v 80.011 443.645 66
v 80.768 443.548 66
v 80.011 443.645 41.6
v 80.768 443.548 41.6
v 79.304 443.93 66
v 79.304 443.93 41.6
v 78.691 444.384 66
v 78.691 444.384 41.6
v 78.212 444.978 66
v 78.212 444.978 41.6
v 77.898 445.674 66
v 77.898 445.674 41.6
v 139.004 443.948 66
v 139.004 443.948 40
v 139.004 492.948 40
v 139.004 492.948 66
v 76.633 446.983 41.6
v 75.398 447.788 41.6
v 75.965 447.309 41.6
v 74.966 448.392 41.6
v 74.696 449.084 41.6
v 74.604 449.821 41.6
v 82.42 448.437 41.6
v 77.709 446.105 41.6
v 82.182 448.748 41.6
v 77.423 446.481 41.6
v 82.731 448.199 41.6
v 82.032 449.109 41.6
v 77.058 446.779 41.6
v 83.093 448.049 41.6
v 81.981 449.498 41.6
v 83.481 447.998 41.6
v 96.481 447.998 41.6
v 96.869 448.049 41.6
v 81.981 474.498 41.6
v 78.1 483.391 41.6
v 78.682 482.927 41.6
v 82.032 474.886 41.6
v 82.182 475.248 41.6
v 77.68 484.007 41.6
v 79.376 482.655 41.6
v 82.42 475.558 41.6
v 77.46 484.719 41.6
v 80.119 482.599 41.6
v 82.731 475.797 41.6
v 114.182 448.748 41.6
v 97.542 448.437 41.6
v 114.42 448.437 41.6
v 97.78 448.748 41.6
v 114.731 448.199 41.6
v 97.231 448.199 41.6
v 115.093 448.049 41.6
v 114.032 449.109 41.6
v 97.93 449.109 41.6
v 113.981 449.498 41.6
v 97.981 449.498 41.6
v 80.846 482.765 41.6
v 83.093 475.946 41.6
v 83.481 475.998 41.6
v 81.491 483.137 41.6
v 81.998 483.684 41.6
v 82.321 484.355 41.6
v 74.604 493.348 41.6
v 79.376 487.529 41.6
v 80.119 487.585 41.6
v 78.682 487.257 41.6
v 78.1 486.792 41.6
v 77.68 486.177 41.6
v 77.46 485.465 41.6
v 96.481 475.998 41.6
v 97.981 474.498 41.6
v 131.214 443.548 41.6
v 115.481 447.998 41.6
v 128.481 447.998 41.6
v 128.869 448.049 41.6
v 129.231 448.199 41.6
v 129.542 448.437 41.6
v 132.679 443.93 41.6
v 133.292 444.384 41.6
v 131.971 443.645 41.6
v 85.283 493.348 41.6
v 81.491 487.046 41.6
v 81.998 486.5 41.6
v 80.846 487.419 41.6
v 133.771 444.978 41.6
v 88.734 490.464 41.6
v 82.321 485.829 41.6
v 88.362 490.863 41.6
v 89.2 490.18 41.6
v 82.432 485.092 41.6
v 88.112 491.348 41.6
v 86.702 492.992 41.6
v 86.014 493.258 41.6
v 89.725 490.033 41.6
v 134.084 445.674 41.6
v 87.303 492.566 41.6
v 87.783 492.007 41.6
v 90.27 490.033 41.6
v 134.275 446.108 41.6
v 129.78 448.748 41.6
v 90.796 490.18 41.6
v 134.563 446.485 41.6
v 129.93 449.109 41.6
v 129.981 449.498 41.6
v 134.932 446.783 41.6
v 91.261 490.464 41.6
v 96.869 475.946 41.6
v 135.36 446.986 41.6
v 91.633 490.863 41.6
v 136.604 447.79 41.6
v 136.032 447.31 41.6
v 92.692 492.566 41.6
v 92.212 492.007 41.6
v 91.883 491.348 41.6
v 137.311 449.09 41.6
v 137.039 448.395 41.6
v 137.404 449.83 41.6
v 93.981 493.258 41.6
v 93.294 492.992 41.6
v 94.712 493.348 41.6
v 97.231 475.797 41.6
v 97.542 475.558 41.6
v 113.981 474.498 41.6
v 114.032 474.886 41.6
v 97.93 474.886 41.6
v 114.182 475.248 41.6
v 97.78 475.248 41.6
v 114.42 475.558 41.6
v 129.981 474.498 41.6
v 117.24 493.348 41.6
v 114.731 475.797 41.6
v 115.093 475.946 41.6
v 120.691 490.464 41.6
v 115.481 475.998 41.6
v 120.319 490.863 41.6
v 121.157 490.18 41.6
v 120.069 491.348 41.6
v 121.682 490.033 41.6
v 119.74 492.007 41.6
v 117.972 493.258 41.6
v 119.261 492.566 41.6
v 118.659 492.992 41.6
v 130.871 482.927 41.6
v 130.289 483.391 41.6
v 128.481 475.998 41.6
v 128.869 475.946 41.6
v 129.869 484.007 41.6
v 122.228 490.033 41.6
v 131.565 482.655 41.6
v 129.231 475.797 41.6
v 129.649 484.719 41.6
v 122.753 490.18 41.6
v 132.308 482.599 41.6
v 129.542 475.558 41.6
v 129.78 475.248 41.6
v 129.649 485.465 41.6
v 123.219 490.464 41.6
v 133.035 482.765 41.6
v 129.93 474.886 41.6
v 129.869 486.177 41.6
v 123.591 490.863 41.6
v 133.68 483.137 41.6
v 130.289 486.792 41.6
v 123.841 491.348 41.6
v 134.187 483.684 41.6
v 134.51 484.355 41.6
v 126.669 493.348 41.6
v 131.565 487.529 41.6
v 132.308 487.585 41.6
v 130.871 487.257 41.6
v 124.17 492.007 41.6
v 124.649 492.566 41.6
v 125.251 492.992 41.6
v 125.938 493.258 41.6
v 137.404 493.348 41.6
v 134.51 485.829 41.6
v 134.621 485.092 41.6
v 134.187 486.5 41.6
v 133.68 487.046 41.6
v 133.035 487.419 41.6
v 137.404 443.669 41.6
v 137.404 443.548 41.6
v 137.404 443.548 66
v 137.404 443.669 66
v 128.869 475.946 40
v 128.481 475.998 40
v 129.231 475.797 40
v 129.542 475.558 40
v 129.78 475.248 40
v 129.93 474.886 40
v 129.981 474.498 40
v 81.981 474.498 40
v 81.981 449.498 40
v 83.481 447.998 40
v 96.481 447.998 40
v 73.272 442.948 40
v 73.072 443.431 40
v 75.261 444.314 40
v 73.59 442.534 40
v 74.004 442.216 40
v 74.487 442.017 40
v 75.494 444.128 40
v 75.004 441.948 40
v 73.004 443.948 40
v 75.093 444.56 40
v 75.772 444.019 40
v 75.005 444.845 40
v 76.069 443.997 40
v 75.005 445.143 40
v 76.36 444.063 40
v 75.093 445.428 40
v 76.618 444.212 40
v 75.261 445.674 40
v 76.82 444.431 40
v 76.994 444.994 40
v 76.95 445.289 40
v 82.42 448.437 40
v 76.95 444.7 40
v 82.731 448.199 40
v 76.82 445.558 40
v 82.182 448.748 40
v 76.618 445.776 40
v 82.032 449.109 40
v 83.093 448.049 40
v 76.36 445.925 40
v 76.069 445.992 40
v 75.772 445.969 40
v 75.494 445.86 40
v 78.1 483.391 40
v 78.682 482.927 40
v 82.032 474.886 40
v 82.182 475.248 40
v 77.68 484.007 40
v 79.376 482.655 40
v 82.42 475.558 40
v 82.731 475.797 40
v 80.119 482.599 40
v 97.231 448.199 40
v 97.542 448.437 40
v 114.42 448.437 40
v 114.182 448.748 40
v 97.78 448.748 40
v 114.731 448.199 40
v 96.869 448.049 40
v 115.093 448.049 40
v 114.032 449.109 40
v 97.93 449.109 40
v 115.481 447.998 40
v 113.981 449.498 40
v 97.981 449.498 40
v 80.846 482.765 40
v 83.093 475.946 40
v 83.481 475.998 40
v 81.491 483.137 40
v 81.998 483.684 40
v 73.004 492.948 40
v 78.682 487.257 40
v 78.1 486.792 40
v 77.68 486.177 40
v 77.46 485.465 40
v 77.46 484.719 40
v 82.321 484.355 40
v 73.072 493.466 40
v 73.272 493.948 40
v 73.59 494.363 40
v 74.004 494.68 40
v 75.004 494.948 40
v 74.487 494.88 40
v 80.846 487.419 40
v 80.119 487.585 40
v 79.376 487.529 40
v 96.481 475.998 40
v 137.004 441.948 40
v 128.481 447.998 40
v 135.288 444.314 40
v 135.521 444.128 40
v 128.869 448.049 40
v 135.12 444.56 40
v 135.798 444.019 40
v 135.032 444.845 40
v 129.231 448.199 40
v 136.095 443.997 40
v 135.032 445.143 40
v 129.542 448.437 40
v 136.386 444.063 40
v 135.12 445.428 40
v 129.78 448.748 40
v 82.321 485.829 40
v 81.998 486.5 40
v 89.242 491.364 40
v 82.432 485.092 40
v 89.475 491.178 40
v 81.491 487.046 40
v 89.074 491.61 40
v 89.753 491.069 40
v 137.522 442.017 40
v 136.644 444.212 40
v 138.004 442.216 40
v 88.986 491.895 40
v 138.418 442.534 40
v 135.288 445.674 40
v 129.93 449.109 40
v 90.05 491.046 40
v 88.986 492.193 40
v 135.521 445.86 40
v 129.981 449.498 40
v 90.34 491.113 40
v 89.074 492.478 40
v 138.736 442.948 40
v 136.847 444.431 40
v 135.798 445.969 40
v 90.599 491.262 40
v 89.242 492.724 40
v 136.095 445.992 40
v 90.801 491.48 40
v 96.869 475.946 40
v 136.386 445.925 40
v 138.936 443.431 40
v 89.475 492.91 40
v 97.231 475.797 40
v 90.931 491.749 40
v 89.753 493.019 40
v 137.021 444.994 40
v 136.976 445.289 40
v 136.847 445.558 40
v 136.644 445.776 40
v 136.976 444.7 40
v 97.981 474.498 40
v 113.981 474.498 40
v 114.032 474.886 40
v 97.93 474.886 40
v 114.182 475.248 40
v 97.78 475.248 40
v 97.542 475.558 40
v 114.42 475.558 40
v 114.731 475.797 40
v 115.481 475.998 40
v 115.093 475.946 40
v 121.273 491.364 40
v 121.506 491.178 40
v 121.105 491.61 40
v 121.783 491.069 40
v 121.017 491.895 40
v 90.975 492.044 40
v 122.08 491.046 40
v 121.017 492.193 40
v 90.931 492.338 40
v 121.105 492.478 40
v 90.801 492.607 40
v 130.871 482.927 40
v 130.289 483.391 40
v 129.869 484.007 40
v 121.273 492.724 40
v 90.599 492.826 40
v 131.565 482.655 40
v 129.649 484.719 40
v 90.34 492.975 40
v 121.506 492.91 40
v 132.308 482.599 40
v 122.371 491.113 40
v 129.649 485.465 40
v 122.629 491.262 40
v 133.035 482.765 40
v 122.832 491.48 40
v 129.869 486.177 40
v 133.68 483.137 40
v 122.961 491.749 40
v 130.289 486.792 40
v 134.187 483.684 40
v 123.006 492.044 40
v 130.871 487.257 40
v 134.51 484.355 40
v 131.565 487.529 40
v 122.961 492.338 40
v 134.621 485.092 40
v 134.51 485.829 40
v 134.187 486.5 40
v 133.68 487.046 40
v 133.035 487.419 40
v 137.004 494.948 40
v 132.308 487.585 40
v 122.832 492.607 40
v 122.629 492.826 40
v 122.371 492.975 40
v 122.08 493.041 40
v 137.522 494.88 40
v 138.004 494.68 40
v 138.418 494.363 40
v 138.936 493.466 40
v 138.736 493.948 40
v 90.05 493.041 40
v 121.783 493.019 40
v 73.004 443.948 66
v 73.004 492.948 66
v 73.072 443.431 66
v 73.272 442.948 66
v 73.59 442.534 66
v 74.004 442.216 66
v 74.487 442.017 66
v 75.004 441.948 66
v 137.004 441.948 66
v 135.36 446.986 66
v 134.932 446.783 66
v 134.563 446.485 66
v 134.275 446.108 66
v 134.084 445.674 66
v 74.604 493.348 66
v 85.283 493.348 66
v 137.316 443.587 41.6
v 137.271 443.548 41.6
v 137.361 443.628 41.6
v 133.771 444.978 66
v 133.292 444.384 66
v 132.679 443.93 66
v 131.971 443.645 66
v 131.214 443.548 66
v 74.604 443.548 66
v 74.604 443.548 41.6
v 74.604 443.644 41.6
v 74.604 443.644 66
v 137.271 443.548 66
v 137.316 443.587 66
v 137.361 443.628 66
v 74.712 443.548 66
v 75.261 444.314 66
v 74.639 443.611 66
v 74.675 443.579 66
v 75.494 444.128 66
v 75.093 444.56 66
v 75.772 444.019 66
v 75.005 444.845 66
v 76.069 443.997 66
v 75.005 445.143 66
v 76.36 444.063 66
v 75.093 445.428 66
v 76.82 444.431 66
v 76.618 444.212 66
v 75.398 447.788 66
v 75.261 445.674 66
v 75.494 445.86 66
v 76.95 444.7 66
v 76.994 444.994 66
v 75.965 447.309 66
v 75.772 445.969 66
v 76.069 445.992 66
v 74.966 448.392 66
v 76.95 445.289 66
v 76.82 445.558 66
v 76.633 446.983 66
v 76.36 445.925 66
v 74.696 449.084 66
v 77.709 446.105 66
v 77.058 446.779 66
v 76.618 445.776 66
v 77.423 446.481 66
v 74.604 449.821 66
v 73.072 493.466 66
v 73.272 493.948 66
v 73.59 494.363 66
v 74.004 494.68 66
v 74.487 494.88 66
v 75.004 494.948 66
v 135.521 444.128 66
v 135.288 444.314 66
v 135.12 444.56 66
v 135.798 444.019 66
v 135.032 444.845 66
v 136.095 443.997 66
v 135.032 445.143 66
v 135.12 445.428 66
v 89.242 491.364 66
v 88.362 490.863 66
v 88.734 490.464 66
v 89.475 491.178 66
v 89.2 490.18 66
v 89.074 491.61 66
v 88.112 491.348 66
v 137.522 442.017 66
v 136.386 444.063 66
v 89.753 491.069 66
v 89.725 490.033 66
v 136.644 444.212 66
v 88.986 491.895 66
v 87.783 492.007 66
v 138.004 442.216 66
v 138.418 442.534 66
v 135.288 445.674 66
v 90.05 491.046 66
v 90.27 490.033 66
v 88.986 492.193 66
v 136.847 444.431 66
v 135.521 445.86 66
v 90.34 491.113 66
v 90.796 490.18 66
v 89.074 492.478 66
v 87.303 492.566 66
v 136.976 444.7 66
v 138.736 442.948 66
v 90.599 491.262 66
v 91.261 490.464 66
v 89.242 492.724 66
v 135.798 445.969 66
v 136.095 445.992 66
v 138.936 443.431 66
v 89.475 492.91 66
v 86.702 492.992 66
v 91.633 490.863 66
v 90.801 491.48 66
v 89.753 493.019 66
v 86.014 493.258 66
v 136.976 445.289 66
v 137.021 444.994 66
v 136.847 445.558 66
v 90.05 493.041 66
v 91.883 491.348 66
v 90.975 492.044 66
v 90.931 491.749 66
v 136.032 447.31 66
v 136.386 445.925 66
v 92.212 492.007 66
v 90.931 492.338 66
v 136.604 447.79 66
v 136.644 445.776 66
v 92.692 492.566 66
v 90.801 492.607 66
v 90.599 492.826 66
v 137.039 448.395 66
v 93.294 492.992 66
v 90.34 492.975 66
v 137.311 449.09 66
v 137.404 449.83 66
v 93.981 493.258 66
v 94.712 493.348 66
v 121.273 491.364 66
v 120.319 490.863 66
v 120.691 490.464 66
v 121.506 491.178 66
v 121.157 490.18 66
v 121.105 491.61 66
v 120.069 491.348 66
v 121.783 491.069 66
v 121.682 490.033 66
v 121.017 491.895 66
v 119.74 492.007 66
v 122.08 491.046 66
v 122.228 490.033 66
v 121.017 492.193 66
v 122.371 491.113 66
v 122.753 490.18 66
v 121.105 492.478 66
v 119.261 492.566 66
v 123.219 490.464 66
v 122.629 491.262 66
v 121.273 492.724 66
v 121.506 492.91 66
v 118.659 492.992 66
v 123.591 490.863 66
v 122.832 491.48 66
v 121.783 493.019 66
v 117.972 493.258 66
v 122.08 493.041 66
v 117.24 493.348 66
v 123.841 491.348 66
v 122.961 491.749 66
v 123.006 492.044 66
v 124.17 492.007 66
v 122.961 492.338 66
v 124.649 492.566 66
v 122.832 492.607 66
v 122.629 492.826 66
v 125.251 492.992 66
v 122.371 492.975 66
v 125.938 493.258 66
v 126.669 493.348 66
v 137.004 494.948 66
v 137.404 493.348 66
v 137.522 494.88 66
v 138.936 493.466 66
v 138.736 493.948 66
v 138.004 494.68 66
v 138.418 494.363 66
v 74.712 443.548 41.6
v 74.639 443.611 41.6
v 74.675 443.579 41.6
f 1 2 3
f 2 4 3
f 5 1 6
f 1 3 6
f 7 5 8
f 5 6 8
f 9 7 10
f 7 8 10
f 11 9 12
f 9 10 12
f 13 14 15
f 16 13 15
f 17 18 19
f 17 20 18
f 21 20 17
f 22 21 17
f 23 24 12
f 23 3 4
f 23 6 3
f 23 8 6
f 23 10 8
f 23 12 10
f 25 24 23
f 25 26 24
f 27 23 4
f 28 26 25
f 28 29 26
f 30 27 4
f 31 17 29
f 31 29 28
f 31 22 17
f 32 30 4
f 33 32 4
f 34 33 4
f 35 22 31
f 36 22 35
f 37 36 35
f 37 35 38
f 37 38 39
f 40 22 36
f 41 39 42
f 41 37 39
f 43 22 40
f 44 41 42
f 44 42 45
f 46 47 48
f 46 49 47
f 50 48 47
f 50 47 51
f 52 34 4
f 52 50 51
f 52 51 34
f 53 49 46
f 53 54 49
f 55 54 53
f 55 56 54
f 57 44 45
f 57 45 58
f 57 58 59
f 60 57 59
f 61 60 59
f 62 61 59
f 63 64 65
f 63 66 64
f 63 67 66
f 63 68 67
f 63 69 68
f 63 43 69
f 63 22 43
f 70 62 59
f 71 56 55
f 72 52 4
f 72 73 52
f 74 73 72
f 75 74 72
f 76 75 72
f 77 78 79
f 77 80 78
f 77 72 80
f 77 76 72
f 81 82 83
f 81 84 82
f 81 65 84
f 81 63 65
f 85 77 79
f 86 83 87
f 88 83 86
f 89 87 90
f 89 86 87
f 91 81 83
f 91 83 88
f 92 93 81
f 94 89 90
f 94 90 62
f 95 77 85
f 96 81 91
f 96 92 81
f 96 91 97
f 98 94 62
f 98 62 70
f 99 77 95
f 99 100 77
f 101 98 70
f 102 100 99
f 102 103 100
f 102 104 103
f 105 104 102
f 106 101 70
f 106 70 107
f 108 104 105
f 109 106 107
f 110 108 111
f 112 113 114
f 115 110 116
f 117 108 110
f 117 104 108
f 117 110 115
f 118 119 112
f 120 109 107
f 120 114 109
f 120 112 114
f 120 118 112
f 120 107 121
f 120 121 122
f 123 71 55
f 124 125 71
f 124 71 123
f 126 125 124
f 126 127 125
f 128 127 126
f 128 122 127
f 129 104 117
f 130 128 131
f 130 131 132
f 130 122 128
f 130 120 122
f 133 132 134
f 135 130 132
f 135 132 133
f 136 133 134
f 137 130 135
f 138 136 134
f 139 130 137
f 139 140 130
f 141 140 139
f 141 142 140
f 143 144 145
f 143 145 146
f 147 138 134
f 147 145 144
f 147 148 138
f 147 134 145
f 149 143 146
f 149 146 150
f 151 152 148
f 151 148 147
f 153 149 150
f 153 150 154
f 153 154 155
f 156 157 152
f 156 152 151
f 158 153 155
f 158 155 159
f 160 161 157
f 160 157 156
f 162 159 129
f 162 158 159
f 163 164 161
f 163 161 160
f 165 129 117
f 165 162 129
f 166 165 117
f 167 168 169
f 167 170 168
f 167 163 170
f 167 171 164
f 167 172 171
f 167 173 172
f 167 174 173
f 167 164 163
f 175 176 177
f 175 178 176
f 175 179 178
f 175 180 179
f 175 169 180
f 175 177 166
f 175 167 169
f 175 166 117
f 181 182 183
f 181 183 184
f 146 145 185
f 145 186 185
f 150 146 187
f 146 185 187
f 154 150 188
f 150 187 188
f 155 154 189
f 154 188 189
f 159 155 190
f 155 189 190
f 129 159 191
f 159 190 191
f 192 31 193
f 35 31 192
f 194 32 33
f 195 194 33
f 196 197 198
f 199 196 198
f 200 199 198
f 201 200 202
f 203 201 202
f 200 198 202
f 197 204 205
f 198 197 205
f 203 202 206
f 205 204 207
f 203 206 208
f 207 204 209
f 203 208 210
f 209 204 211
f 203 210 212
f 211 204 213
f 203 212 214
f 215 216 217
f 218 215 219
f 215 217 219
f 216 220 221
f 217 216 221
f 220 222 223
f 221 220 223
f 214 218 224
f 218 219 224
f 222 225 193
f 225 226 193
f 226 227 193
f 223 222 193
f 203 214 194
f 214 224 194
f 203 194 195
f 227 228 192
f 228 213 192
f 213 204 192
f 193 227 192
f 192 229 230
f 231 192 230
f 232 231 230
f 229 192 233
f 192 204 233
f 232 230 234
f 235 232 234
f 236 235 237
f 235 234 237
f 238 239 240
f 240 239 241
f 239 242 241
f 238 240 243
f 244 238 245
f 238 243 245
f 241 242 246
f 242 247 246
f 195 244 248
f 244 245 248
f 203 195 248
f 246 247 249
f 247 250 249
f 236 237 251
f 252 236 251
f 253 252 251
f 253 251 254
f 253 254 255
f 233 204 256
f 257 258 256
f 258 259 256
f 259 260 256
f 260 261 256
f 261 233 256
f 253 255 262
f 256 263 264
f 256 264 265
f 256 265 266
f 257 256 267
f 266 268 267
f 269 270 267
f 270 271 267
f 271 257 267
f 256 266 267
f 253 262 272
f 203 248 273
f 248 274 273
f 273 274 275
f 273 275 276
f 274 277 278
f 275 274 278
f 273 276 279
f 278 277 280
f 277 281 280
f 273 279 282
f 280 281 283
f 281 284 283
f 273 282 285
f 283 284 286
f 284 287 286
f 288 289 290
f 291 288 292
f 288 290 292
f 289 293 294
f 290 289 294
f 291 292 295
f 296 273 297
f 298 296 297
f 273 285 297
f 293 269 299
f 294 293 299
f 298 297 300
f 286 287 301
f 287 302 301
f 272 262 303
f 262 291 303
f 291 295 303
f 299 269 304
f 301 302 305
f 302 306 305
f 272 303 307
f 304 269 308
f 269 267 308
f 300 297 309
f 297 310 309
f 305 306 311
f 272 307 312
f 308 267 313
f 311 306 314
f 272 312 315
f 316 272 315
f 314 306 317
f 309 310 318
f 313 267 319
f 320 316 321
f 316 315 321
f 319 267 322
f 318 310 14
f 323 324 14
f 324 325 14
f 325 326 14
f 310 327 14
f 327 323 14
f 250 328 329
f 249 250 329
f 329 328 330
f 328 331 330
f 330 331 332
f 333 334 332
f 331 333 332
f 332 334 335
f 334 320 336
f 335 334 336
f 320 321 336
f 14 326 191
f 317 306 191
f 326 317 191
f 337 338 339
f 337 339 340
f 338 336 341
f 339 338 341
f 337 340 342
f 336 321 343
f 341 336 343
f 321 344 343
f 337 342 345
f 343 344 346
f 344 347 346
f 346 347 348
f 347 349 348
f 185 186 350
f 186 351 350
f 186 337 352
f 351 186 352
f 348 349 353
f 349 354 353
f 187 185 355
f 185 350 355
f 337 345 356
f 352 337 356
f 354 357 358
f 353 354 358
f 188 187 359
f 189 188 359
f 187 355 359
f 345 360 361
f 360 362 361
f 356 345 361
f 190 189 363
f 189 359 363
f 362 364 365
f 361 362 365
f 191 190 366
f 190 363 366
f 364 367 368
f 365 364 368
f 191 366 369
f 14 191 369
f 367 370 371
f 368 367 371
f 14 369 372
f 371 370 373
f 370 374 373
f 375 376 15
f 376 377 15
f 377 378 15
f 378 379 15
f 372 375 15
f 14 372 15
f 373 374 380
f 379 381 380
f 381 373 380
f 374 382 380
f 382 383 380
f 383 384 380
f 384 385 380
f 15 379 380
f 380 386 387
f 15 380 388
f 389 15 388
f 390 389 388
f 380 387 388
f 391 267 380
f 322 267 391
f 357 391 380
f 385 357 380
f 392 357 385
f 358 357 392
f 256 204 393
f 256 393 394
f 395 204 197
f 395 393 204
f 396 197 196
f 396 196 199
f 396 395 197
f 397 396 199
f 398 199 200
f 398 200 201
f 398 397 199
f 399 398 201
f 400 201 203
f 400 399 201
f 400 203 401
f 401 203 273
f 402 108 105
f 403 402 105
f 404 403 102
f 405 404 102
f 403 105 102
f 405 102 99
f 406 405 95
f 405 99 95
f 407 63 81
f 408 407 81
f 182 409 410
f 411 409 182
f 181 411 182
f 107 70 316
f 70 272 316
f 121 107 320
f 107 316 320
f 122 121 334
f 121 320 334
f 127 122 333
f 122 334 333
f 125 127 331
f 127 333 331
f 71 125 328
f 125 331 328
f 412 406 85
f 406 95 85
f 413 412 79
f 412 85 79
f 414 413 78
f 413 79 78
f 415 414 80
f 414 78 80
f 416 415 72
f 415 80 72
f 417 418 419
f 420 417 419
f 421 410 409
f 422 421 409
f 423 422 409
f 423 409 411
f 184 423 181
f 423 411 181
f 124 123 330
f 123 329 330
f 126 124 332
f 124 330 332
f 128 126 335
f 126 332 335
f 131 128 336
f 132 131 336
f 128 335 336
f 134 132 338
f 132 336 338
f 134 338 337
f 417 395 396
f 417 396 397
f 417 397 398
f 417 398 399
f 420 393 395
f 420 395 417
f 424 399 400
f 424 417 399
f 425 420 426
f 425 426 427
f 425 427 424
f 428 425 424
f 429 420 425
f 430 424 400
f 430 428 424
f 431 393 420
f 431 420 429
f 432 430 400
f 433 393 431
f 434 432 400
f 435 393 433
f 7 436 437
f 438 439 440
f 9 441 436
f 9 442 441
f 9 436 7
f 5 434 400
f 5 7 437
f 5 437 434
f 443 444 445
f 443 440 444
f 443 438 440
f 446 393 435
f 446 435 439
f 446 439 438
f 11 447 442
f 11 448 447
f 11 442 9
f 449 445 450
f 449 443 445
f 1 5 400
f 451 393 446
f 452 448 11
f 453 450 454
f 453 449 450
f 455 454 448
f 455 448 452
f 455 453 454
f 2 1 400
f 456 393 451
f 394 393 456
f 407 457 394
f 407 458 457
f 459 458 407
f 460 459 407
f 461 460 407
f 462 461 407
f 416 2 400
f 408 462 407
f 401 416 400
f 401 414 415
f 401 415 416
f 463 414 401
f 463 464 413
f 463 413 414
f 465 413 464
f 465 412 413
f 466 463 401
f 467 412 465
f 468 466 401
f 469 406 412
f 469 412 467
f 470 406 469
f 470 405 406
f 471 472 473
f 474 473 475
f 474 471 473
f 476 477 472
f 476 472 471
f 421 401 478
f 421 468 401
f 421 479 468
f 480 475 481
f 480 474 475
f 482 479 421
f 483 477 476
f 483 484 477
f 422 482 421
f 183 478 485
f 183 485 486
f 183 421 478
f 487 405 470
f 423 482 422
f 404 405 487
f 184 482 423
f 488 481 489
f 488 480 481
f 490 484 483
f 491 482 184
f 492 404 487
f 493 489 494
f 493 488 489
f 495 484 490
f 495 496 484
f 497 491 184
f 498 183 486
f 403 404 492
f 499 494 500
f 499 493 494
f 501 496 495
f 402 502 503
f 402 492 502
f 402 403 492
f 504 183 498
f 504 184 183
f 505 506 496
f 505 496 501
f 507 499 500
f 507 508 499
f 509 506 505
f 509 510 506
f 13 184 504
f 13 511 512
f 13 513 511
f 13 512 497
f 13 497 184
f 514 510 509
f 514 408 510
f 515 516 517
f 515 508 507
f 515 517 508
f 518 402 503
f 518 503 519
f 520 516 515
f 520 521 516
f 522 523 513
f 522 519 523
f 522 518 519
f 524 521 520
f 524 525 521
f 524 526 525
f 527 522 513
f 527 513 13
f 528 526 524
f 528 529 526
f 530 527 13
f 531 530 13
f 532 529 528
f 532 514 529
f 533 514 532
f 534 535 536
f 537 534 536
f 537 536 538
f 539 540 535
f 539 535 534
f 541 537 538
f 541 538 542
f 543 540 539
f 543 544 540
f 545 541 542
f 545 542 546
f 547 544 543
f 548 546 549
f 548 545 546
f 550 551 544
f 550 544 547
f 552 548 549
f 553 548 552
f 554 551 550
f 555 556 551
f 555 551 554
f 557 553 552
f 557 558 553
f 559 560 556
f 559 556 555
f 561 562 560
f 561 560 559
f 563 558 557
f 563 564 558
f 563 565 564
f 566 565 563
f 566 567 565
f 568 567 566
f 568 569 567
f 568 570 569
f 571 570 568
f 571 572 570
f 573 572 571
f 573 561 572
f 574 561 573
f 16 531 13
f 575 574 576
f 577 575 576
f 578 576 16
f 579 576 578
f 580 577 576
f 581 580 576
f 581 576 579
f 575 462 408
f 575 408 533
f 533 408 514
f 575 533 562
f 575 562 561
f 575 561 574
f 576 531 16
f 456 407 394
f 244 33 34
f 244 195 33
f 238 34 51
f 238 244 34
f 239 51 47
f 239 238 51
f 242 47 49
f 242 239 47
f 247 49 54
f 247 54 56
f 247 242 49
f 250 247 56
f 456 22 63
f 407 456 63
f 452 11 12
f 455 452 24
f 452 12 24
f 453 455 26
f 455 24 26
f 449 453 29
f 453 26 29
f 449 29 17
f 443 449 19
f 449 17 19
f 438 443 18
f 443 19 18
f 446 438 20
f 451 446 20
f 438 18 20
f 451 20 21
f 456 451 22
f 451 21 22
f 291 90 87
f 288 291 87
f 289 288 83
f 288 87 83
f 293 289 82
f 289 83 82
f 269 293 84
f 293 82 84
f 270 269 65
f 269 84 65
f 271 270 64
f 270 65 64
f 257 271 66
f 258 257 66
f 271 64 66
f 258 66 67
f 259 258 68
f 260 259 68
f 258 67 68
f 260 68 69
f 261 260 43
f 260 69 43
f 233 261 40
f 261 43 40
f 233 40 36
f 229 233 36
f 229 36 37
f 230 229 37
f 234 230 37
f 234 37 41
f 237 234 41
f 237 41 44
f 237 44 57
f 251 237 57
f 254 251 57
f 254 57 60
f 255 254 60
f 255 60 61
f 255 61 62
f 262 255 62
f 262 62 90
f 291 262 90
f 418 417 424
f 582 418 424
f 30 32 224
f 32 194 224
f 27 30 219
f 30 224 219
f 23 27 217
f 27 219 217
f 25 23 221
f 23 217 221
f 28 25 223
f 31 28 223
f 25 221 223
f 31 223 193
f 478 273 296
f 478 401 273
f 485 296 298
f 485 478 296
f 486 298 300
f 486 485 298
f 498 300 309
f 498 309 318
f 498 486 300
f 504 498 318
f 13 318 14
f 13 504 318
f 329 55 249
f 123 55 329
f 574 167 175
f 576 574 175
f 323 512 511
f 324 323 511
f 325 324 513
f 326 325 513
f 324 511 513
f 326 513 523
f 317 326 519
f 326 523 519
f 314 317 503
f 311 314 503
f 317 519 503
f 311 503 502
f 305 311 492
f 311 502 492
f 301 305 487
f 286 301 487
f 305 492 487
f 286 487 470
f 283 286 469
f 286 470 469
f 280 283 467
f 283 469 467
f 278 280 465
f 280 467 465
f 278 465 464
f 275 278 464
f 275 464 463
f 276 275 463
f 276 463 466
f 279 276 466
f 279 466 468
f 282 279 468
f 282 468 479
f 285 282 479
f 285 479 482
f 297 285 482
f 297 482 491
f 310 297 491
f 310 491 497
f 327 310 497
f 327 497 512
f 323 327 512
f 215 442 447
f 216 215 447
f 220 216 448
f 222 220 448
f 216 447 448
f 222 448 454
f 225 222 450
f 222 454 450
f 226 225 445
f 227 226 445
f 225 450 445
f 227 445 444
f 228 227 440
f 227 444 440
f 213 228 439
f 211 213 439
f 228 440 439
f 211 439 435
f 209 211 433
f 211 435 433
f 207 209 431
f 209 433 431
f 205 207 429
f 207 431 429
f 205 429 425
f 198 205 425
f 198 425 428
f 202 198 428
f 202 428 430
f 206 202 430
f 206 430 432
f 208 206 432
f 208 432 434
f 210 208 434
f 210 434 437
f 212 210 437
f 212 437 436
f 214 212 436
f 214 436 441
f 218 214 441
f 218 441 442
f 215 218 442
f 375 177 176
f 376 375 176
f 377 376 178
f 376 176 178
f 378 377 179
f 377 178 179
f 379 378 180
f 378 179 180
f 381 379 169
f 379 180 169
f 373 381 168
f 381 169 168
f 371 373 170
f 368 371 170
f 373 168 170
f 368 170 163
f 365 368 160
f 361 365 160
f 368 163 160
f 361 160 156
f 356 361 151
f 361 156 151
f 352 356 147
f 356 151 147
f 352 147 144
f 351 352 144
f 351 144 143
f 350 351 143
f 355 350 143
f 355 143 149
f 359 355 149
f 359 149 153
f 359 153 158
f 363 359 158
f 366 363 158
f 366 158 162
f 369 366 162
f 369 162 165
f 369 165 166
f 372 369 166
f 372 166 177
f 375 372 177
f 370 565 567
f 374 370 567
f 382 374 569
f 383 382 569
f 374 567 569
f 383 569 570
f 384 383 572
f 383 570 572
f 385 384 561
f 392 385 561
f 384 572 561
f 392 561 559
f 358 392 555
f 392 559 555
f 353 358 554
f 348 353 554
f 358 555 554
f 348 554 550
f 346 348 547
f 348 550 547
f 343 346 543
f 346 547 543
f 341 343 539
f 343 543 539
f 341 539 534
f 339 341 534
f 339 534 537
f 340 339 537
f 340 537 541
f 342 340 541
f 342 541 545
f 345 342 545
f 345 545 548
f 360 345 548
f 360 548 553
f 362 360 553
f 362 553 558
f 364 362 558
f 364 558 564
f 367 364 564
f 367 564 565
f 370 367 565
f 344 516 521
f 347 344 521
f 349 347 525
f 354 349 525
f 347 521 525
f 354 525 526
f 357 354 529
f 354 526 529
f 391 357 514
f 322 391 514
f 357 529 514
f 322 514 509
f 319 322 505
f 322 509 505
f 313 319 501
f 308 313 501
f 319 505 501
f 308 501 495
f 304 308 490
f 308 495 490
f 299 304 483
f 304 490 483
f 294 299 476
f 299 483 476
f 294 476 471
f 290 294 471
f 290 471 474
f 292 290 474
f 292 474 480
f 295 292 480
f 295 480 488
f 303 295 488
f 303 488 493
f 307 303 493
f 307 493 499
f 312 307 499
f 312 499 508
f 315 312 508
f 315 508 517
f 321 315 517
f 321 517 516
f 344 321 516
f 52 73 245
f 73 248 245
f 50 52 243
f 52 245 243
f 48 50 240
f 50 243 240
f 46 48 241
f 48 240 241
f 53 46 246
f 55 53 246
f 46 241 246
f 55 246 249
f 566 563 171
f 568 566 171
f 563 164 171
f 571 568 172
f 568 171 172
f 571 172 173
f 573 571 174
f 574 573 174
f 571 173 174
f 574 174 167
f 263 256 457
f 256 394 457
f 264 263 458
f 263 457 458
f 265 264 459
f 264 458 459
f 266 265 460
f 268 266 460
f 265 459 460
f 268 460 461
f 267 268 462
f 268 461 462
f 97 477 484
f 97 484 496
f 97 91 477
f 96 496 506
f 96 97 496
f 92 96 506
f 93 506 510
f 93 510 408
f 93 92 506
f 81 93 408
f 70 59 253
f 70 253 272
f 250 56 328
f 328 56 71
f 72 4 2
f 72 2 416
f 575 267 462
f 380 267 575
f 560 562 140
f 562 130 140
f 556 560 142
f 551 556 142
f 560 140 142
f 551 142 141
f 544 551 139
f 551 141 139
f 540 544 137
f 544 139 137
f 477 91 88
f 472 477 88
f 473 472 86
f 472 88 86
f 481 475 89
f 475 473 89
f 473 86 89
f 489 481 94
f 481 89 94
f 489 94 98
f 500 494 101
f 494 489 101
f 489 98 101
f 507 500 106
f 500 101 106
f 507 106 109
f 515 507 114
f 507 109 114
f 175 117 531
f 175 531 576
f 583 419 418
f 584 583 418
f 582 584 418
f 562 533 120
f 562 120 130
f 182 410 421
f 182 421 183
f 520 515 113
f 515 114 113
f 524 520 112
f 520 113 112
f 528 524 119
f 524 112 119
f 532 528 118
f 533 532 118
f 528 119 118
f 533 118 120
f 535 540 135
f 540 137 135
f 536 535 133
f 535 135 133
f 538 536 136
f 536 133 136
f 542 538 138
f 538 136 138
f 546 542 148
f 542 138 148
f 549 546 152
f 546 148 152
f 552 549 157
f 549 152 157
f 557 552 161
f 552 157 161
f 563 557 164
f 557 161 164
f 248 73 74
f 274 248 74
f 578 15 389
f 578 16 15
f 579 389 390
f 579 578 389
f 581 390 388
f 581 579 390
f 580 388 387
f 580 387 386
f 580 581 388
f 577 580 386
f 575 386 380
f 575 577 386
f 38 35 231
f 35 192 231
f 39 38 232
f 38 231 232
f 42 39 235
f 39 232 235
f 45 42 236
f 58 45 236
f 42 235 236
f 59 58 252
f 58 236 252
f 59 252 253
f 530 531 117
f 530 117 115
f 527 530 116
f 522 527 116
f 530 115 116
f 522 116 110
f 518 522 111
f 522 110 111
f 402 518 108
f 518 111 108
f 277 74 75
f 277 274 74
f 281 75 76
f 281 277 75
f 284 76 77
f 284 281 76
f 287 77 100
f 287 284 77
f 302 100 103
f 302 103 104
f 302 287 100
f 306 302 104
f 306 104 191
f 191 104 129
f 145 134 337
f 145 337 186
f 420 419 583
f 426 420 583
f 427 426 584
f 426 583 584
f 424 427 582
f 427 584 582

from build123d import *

# Parameters (mm, degrees)
SKETCH1_W           = 66
SKETCH1_H           = 53
BOSS_EXTRUDE1_DEPTH = 26
SHELL1_T            = -1.6
FILLET1_R           = 2
SKETCH2_R           = 2.5
SKETCH2_W           = 16
SKETCH2_H           = 28
CUT_EXTRUDE1_DEPTH  = 5
SKETCH3_R           = 2
BOSS_EXTRUDE2_DEPTH = 24.4
FILLET2_R           = 3
FILLET3_R           = 1.5
SKETCH4_R           = 1
CUT_EXTRUDE2_DEPTH  = 515.754449712


with BuildPart() as part:
    # Sketch1 → Boss-Extrude1 (new body)
    with BuildSketch(Plane.XY.offset(40)):
        with Locations((106.004254286, 468.448442556)):
            Rectangle(SKETCH1_W, SKETCH1_H)
    extrude(amount=BOSS_EXTRUDE1_DEPTH)

    # Shell1
    shell1_openings = [part.faces().sort_by_distance(p)[0] for p in [
        (106.004254286, 468.448442556, 66),
    ]]
    offset(amount=SHELL1_T, openings=shell1_openings, kind=Kind.INTERSECTION)

    # Fillet1
    fillet1_edges = [part.edges().sort_by_distance(p)[0] for p in [
        (73.004254286, 494.948442556, 53),
        (139.004254286, 494.948442556, 53),
        (139.004254286, 441.948442556, 53),
        (73.004254286, 441.948442556, 53),
    ]]
    fillet(fillet1_edges, radius=FILLET1_R)

    # Sketch2 → Cut-Extrude1 (cut)
    with BuildSketch(Plane.XY.offset(41.6)):
        with Locations((79.932206481, 485.091899203)):
            Circle(SKETCH2_R)
        with Locations((132.121487701, 485.091899203)):
            Circle(SKETCH2_R)
        with Locations((121.980911954, 461.997551837)):
            Rectangle(SKETCH2_W, SKETCH2_H)
        with Locations((89.980911954, 461.997551837)):
            Rectangle(SKETCH2_W, SKETCH2_H)
    extrude(amount=-CUT_EXTRUDE1_DEPTH, mode=Mode.SUBTRACT)

    # Sketch3 → Boss-Extrude2 (add)
    with BuildSketch(Plane.XY.offset(41.6)):
        with Locations((89.997613128, 492.01389561)):
            Circle(SKETCH3_R)
        with Locations((121.954957607, 492.01389561)):
            Circle(SKETCH3_R)
        with Locations((75.98529147, 445.090629457)):
            Circle(SKETCH3_R)
        with Locations((135.997102491, 445.090629457)):
            Circle(SKETCH3_R)
    extrude(amount=BOSS_EXTRUDE2_DEPTH)

    # Fillet2
    fillet2_edges = [part.edges().sort_by_distance(p)[0] for p in [
        (88.507987521, 493.348442556, 53.8),
        (91.487238734, 493.348442556, 53.8),
        (120.465332, 493.348442556, 53.8),
        (123.444583213, 493.348442556, 53.8),
        (134.723658514, 443.548442556, 53.8),
        (137.404254286, 446.5118697, 53.8),
        (77.258735447, 443.548442556, 53.8),
        (74.604254286, 446.537258746, 53.8),
    ]]
    fillet(fillet2_edges, radius=FILLET2_R)

    # Fillet3
    fillet3_edges = [part.edges().sort_by_distance(p)[0] for p in [
        (81.980911954, 447.997551837, 40.8),
        (81.980911954, 475.997551837, 40.8),
        (97.980911954, 475.997551837, 40.8),
        (97.980911954, 447.997551837, 40.8),
        (113.980911954, 475.997551837, 40.8),
        (129.980911954, 475.997551837, 40.8),
        (129.980911954, 447.997551837, 40.8),
        (113.980911954, 447.997551837, 40.8),
    ]]
    fillet(fillet3_edges, radius=FILLET3_R)

    # Sketch4 → Cut-Extrude2 (cut, through all)
    with BuildSketch(Plane.XY.offset(66)):
        with Locations((89.975104107, 492.043680815)):
            Circle(SKETCH4_R)
        with Locations((122.005633098, 492.043680815)):
            Circle(SKETCH4_R)
        with Locations((75.994176926, 444.994296882)):
            Circle(SKETCH4_R)
        with Locations((136.02065658, 444.994296882)):
            Circle(SKETCH4_R)
    extrude(amount=-CUT_EXTRUDE2_DEPTH, mode=Mode.SUBTRACT)


solid = part.part
